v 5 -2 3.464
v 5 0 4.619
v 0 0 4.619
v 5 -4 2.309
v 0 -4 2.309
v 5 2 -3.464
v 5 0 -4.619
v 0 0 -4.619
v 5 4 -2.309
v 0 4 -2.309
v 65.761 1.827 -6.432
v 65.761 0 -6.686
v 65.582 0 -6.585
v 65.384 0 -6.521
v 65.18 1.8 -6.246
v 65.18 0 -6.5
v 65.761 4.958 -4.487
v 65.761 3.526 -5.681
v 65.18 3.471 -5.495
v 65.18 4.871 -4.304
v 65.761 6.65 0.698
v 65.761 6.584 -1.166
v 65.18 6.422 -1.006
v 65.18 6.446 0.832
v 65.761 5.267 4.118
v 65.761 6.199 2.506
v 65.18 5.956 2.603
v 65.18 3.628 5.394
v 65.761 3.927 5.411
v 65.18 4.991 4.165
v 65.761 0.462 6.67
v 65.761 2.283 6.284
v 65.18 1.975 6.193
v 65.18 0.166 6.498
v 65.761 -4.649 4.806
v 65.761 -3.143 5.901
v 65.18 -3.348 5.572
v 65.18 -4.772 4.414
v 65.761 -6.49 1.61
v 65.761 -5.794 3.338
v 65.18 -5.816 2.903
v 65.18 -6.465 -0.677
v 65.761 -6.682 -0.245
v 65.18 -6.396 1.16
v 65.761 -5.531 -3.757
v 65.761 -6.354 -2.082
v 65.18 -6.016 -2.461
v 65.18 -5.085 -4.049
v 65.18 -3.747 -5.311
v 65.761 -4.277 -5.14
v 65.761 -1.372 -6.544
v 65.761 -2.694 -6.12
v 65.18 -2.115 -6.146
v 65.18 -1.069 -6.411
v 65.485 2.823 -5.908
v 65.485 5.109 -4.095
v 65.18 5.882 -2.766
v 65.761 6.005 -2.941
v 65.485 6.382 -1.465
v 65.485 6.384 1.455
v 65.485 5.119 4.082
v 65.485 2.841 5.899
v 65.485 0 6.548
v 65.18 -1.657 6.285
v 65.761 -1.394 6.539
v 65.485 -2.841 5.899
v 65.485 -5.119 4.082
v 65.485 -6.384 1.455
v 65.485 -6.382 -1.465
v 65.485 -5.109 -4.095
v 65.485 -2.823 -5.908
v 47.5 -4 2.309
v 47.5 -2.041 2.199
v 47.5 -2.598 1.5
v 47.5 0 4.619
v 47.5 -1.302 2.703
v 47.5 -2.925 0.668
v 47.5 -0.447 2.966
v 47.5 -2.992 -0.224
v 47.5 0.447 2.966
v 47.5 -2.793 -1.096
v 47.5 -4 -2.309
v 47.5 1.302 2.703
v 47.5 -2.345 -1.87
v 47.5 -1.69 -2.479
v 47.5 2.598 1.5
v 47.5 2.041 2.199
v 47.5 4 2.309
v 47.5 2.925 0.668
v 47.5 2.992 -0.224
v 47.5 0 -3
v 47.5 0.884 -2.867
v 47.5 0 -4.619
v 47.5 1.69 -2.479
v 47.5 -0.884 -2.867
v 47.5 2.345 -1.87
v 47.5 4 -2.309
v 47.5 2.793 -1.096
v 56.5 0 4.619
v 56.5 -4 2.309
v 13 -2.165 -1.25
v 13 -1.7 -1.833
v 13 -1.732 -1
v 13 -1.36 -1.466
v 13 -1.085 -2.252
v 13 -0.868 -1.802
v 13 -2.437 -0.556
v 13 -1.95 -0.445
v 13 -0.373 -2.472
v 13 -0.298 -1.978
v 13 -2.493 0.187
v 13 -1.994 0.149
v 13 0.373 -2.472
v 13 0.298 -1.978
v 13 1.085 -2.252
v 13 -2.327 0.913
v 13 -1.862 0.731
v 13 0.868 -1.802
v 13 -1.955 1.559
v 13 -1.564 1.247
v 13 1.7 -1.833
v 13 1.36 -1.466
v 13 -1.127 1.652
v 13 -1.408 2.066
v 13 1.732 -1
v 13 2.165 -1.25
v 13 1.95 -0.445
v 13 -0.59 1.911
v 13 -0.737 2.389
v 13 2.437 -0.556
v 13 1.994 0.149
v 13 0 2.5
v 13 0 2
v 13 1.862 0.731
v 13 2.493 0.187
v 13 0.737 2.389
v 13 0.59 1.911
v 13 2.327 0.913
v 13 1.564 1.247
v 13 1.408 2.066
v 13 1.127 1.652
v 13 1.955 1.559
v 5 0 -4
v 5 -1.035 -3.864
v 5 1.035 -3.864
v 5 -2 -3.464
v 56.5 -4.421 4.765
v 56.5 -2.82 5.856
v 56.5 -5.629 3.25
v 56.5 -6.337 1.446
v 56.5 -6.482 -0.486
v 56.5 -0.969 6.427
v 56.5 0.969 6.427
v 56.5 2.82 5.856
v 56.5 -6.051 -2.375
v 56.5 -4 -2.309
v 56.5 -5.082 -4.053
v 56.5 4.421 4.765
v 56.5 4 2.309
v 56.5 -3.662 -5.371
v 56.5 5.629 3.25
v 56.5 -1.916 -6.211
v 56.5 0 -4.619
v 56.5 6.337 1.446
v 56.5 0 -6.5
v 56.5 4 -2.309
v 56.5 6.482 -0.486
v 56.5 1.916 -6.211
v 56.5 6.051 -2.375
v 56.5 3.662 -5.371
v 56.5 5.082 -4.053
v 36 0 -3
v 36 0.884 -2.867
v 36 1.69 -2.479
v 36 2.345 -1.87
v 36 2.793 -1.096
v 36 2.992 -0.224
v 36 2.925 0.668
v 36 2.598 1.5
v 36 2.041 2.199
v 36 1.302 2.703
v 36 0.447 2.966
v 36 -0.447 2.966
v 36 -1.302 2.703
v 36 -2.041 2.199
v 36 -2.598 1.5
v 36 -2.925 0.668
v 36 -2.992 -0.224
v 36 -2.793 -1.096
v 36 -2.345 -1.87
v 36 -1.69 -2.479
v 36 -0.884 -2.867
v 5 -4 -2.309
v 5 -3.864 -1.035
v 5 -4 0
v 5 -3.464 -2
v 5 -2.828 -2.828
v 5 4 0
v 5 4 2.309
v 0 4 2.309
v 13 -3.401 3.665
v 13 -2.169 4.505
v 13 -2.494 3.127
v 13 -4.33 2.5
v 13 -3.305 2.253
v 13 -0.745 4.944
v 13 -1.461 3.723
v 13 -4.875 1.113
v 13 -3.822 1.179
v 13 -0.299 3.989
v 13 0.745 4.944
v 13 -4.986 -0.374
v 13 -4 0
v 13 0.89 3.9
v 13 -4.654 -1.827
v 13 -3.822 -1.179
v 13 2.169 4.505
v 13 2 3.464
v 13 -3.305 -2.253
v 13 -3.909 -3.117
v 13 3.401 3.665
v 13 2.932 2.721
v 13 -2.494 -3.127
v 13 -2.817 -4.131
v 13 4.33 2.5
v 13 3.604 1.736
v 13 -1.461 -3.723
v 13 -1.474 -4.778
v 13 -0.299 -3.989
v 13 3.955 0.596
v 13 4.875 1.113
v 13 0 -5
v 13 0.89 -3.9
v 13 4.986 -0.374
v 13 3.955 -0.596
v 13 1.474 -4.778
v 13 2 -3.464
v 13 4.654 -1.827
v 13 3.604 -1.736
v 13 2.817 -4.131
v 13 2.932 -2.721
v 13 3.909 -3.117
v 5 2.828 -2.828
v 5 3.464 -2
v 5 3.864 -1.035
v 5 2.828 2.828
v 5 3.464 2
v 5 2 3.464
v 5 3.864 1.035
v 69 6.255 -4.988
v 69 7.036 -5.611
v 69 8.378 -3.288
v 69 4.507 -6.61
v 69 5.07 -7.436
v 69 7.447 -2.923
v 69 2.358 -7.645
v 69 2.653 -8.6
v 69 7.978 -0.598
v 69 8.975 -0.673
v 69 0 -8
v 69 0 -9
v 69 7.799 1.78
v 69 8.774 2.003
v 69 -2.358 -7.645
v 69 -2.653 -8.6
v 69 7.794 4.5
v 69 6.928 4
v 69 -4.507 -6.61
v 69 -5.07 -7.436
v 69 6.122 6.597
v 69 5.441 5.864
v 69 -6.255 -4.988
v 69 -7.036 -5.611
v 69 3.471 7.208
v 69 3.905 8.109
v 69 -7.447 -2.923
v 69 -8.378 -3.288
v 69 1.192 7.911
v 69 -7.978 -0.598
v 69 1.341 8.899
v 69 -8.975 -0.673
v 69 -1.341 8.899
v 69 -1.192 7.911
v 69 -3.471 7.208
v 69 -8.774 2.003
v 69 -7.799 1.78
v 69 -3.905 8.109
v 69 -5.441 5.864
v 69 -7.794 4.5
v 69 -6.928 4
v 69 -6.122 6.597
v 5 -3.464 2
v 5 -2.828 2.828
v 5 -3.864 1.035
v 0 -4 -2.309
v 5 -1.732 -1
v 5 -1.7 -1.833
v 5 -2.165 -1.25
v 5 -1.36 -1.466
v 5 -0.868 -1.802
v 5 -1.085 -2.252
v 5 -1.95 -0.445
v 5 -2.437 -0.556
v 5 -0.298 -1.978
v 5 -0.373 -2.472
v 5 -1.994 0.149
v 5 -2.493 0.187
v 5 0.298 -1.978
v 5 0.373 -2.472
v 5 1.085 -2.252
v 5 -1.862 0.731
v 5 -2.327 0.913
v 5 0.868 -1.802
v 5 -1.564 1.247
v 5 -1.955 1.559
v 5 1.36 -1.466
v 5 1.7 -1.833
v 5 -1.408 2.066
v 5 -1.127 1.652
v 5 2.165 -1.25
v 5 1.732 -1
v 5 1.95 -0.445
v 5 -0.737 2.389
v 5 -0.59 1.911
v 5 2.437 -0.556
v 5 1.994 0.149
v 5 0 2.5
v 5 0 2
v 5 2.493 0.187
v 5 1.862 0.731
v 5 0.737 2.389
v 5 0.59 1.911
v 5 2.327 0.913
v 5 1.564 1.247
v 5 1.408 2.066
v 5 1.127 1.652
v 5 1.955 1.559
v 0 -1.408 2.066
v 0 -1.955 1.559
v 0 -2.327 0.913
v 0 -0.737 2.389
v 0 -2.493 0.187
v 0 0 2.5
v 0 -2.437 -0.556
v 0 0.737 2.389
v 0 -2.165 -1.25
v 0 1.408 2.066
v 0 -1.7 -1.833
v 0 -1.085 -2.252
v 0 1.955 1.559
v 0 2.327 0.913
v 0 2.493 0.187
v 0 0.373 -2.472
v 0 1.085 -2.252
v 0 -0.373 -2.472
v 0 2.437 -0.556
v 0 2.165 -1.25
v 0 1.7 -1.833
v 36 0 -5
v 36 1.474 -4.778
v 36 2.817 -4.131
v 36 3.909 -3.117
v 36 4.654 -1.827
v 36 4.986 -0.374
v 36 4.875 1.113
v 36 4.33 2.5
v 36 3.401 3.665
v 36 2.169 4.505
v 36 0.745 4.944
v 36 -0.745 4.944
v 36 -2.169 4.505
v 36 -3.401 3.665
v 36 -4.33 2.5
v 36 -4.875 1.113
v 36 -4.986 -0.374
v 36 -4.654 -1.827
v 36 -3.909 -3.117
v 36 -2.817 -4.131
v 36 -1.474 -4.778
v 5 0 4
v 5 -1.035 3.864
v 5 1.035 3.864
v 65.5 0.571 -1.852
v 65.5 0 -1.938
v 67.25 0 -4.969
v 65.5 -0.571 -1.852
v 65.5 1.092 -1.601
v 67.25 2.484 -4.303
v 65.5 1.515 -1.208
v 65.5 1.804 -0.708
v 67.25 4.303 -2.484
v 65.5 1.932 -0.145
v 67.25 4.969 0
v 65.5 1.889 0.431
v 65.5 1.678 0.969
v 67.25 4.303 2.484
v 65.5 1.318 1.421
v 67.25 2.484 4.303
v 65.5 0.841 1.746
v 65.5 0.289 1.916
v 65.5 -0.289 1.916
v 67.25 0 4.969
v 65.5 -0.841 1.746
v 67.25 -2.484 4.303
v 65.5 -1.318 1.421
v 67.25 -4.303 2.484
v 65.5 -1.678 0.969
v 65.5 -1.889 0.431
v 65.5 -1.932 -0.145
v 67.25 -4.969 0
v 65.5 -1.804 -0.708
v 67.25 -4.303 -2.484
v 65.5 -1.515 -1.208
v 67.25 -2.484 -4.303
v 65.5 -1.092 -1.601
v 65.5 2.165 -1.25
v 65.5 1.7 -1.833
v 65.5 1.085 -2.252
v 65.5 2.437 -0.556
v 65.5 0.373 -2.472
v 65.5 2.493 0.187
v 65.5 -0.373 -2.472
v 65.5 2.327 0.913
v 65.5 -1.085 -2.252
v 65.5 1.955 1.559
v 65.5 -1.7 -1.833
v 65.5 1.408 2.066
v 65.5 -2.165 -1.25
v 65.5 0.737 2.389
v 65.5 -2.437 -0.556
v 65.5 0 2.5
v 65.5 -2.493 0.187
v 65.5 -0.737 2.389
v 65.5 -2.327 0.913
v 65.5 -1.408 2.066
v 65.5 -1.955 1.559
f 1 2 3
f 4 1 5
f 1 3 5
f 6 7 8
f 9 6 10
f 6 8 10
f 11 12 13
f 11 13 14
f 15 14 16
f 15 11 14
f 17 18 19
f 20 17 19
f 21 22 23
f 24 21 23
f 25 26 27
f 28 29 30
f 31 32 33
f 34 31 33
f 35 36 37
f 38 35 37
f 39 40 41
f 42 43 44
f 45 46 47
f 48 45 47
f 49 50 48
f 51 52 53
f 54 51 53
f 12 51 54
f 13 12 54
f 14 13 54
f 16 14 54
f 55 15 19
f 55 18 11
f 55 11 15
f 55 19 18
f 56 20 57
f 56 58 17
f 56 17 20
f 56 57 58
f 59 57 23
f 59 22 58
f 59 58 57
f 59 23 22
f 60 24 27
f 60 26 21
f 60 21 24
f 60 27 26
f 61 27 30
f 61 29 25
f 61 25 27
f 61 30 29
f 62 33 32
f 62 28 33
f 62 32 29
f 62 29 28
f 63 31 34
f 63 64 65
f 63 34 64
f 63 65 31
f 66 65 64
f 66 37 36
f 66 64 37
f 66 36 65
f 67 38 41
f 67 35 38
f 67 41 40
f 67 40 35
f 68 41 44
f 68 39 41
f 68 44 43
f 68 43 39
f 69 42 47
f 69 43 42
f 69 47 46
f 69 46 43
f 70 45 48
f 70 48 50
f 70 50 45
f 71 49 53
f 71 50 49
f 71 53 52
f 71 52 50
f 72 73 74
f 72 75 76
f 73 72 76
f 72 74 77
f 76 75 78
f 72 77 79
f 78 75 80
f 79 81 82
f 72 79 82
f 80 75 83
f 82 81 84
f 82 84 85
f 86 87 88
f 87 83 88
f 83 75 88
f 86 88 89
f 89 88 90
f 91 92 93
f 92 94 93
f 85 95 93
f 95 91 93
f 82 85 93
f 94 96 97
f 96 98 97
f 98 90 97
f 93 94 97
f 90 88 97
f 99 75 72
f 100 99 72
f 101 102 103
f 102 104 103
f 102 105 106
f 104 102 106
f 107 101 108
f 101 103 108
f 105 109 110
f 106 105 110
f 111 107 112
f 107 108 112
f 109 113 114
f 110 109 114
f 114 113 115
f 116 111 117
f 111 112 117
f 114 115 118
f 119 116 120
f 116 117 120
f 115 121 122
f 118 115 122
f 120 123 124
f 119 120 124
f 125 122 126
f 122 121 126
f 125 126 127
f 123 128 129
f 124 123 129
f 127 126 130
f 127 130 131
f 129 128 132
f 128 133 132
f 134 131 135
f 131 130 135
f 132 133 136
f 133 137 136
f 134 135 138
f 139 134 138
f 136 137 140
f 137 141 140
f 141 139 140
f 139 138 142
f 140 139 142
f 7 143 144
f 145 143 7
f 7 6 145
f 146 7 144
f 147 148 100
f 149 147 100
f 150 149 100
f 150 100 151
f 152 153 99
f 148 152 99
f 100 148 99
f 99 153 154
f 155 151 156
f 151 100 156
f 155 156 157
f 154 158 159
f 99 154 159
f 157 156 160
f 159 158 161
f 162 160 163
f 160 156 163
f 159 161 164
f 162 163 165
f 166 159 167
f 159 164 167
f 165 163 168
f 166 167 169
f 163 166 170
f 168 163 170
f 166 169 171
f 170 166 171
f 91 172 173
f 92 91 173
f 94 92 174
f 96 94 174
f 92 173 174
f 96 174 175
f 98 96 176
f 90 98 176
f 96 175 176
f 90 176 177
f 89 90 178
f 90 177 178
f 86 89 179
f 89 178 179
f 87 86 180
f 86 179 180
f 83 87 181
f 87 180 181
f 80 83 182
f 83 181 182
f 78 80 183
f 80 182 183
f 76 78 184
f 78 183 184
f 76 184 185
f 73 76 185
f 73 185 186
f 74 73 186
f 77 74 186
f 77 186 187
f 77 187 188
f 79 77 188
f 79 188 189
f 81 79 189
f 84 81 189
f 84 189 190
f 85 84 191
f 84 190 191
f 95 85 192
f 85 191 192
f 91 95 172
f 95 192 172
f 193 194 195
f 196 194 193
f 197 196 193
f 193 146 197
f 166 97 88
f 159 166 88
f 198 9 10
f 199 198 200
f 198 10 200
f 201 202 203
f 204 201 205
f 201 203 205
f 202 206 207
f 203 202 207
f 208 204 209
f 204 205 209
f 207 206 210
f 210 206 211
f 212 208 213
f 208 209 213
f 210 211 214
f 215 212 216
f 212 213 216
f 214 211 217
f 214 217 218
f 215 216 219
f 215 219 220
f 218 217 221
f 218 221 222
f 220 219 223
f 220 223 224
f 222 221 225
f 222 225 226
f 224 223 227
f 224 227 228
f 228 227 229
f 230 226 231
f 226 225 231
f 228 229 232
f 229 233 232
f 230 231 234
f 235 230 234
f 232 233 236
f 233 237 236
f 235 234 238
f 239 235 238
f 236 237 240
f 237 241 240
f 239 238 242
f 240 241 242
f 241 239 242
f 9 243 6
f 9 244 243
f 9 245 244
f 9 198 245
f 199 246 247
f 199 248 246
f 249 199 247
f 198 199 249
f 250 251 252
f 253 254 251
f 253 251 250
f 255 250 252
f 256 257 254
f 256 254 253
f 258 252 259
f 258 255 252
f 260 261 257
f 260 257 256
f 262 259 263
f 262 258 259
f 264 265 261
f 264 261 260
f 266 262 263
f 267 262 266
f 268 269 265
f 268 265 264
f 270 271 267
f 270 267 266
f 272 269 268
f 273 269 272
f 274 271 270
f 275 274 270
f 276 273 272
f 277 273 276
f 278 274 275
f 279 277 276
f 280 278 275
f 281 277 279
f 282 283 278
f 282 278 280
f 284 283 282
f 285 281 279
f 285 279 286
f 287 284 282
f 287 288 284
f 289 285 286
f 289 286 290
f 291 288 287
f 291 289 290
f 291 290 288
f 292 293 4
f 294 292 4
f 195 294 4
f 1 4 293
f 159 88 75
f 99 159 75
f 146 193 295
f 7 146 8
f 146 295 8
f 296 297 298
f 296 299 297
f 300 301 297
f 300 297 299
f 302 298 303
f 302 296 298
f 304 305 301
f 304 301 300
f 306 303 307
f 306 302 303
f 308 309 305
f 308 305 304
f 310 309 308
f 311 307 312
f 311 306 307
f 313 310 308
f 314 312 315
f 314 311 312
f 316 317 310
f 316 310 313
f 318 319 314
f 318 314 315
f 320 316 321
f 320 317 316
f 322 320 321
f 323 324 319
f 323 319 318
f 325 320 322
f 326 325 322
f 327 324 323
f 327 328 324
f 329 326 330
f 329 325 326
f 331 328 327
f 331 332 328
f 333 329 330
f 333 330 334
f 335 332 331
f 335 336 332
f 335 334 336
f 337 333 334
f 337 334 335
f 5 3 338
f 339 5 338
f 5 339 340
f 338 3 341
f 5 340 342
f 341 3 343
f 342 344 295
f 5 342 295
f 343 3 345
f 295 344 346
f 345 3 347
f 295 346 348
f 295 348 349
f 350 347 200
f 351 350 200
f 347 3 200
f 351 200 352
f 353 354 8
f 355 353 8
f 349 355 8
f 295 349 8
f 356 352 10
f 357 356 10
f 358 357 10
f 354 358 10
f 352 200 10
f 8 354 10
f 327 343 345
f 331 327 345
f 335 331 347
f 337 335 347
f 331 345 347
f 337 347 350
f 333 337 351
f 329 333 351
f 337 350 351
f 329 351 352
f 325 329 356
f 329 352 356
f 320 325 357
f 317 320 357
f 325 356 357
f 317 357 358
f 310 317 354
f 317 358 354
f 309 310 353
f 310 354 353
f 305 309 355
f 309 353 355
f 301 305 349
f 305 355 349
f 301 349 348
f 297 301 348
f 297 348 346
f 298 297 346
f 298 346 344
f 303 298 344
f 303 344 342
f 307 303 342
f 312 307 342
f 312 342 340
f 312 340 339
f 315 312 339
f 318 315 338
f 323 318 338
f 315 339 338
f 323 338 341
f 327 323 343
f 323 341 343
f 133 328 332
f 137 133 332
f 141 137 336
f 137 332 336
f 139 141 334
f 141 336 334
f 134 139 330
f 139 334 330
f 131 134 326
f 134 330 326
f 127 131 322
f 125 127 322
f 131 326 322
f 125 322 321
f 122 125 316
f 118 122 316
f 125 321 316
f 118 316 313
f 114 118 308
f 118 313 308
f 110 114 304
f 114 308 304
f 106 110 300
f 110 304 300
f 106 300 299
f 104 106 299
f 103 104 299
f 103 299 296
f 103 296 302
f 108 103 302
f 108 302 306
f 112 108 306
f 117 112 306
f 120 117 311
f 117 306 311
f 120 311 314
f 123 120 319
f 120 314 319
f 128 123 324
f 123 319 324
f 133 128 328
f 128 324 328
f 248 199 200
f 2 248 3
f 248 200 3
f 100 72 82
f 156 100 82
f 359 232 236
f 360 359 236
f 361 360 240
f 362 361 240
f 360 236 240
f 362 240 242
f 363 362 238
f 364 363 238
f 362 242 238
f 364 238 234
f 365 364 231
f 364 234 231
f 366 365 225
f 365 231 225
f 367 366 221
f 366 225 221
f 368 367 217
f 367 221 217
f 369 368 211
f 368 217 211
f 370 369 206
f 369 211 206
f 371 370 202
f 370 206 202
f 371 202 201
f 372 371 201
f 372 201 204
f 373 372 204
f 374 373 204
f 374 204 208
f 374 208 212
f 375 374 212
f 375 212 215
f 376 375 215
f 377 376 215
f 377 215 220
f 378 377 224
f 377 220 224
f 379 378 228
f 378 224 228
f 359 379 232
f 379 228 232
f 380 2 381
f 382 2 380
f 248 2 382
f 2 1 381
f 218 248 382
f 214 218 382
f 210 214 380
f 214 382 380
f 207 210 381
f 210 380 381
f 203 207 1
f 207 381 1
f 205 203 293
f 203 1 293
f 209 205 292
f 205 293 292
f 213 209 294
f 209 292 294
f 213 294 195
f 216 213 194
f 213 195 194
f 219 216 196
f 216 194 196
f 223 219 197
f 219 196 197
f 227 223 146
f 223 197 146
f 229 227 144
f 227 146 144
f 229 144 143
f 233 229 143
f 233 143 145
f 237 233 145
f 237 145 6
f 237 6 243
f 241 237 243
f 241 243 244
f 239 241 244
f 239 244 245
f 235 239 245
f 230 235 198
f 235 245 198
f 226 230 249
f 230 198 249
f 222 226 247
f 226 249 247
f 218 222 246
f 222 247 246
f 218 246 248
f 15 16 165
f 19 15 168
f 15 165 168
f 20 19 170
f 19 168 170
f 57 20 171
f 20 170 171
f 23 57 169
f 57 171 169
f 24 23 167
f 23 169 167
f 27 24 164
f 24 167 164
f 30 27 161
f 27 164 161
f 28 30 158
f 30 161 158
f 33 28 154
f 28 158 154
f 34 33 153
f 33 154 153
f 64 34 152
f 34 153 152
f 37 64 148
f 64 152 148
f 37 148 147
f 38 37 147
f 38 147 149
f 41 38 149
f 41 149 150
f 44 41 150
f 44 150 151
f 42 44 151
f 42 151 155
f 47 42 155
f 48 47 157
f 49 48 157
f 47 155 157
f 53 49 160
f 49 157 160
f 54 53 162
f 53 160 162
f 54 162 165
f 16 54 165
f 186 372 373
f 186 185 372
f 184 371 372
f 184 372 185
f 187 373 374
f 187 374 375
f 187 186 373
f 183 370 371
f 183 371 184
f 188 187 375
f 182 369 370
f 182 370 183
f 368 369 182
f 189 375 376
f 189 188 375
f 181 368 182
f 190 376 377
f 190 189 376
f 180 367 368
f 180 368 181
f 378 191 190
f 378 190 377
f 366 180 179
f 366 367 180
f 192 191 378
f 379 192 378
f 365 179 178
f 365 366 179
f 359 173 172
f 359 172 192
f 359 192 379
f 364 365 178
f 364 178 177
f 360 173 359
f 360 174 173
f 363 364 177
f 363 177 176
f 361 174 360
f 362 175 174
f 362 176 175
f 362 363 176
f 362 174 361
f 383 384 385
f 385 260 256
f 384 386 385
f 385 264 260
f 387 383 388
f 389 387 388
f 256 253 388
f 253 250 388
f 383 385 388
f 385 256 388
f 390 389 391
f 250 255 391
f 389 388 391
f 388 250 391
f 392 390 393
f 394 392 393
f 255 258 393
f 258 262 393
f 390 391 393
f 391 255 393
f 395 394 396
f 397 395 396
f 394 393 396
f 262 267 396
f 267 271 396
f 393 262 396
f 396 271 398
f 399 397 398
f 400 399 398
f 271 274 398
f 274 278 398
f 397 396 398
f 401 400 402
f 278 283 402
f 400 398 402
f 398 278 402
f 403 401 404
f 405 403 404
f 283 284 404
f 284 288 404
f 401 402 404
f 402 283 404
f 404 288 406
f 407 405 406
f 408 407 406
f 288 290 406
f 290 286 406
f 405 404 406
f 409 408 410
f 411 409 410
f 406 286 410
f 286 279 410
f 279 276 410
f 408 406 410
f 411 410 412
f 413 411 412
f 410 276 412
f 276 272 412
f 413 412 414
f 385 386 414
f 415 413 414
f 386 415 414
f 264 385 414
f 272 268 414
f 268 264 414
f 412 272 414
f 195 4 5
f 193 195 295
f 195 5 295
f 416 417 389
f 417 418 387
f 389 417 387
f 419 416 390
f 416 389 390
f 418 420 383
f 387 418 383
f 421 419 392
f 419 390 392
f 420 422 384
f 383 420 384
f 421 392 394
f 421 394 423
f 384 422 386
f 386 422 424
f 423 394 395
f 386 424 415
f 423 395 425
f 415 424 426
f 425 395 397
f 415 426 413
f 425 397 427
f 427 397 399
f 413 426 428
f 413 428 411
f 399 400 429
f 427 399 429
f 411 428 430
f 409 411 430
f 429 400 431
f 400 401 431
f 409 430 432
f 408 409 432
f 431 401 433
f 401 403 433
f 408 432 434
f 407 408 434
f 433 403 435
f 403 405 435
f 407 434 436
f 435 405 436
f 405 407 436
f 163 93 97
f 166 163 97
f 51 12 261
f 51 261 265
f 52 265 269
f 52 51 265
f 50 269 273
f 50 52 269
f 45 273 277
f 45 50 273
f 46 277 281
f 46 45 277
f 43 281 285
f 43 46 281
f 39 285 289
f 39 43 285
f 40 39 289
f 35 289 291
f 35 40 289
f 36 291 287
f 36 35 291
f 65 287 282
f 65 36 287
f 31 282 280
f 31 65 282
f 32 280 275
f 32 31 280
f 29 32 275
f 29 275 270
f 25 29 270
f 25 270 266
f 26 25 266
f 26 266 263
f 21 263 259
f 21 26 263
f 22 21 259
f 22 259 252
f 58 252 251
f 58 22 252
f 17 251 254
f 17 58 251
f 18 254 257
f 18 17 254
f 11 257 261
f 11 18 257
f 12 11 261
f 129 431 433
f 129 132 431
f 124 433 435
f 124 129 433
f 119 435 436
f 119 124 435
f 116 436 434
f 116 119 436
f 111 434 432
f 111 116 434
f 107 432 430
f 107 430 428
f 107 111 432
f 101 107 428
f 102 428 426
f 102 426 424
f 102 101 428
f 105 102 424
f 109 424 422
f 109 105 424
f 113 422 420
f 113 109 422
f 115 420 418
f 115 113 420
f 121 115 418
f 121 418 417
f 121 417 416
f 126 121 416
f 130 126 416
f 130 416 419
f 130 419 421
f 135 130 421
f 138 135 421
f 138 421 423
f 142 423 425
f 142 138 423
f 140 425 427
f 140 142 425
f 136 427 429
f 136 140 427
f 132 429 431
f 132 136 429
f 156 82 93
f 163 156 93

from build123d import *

# Parameters (mm, degrees)
EXTRUDE_1_DEPTH     = 5
SKETCH_2_R          = 4
EXTRUDE_2_DEPTH     = 8
SKETCH_3_R          = 5
EXTRUDE_3_DEPTH     = 23
SKETCH_4_R          = 3
EXTRUDE_4_DEPTH     = 11.5
EXTRUDE_5_DEPTH     = 9
SKETCH_6_R          = 2.5
CUT_EXTRUDE_1_DEPTH = 5
SKETCH_7_R          = 2
CUT_EXTRUDE_2_DEPTH = 8
SKETCH_8_R          = 2.5
CUT_EXTRUDE_3_DEPTH = 45.070965499
SKETCH_9_R          = 6.5
EXTRUDE_6_DEPTH     = 9
FILLET_1_R          = 1
SKETCH_11_R         = 8
CUT_EXTRUDE_4_DEPTH = 3.5
CUT_EXTRUDE_4_DRAFT = -60
CUT_EXTRUDE_START   = -10
SKETCH_12_R         = 2.5
CUT_EXTRUDE_5_DEPTH = 10


with BuildPart() as part:
    # 草图1 → 凸台-拉伸1 (new body)
    with BuildSketch(Plane(origin=(0, 0, 0), x_dir=(0, 0, -1), z_dir=(1, 0, 0))):
        Polygon((2.309401077, 4), (-2.309401077, 4), (-4.618802154, 0), (-2.309401077, -4), (2.309401077, -4), (4.618802154, 0), align=None)
    extrude(amount=EXTRUDE_1_DEPTH)

    # 草图2 → 凸台-拉伸2 (add)
    with BuildSketch(Plane(origin=(5, 0, 0), x_dir=(0, 0, -1), z_dir=(1, 0, 0))):
        with Locations(Location((0, 0, 0), (0, 0, 150))):
            Circle(SKETCH_2_R)
    extrude(amount=EXTRUDE_2_DEPTH)

    # 草图3 → 凸台-拉伸3 (add)
    with BuildSketch(Plane(origin=(13, 0, 0), x_dir=(0, 0, -1), z_dir=(1, 0, 0))):
        Circle(SKETCH_3_R)
    extrude(amount=EXTRUDE_3_DEPTH)

    # 草图4 → 凸台-拉伸4 (add)
    with BuildSketch(Plane(origin=(36, 0, 0), x_dir=(0, 0, -1), z_dir=(1, 0, 0))):
        Circle(SKETCH_4_R)
    extrude(amount=EXTRUDE_4_DEPTH)

    # 草图5 → 凸台-拉伸5 (add)
    with BuildSketch(Plane(origin=(47.5, 0, 0), x_dir=(0, 0, -1), z_dir=(1, 0, 0))):
        Polygon((2.309401077, 4), (-2.309401077, 4), (-4.618802154, 0), (-2.309401077, -4), (2.309401077, -4), (4.618802154, 0), align=None)
    extrude(amount=EXTRUDE_5_DEPTH)

    # 草图6 → 切除-拉伸1 (cut)
    with BuildSketch(Plane.ZY):
        Circle(SKETCH_6_R)
    extrude(amount=-CUT_EXTRUDE_1_DEPTH, mode=Mode.SUBTRACT)

    # 草图7 → 切除-拉伸2 (cut)
    with BuildSketch(Plane.ZY.offset(-5)):
        Circle(SKETCH_7_R)
    extrude(amount=-CUT_EXTRUDE_2_DEPTH, mode=Mode.SUBTRACT)

    # 草图8 → 切除-拉伸3 (cut, through all)
    with BuildSketch(Plane.ZY.offset(-13)):
        Circle(SKETCH_8_R)
    extrude(amount=-CUT_EXTRUDE_3_DEPTH, mode=Mode.SUBTRACT)

    # 草图9 → 凸台-拉伸6 (add)
    with BuildSketch(Plane(origin=(56.5, 0, 0), x_dir=(0, 0, -1), z_dir=(1, 0, 0))):
        Circle(SKETCH_9_R)
    extrude(amount=EXTRUDE_6_DEPTH)

    # 草图10 → 旋转1 (revolve)
    with BuildSketch(Plane(origin=(0, 0, 0), x_dir=(-1, 0, 0), z_dir=(0, 0, -1)), mode=Mode.PRIVATE) as revolve_1_sk:
        Polygon((-65.5, 0), (-69, 0), (-69, 9), (-65.5, 6.5), align=None)
    revolve(revolve_1_sk.sketch.rotate(Axis((65.5, 0, 0), (-1, 0, 0)), 90), axis=Axis((65.5, 0, 0), (-1, 0, 0)))

    # 圆角1
    fillet_1_edges = [part.edges().sort_by_distance(p)[0] for p in [
        (65.5, 0, 6.5),
    ]]
    fillet(fillet_1_edges, radius=FILLET_1_R)


with BuildPart() as cut_extrude_4_tool:
    # 草图11 → 切除-拉伸4 (with draft: the straight prism first)
    with BuildSketch(Plane(origin=(69, 0, 0), x_dir=(0, 0, -1), z_dir=(1, 0, 0))):
        Circle(SKETCH_11_R)
    extrude(amount=-CUT_EXTRUDE_4_DEPTH)
    # 切除-拉伸4: the draft: its side faces are tilted about the plane it starts from
    cut_extrude_4_sides = [cut_extrude_4_tool.faces().sort_by_distance(p)[0] for p in [
        (67.25, 0, 8),
    ]]
    draft(cut_extrude_4_sides, Plane(origin=(69, 0, 0), x_dir=(0, 0, -1), z_dir=(1, 0, 0)), CUT_EXTRUDE_4_DRAFT)


with BuildPart() as part_1:
    add(part.part)

    # 切除-拉伸4: cut by cut_extrude_4_tool
    add(cut_extrude_4_tool.part, mode=Mode.SUBTRACT)

    # 草图12 → 切除-拉伸5 (cut)
    with BuildSketch(Plane(origin=(65.5, 0, 0), x_dir=(0, 0, -1), z_dir=(1, 0, 0)).offset(CUT_EXTRUDE_START)):
        with Locations(Location((0, 0, 0), (0, 0, 180))):
            Circle(SKETCH_12_R)
    extrude(amount=CUT_EXTRUDE_5_DEPTH, mode=Mode.SUBTRACT)


solid = part_1.part
